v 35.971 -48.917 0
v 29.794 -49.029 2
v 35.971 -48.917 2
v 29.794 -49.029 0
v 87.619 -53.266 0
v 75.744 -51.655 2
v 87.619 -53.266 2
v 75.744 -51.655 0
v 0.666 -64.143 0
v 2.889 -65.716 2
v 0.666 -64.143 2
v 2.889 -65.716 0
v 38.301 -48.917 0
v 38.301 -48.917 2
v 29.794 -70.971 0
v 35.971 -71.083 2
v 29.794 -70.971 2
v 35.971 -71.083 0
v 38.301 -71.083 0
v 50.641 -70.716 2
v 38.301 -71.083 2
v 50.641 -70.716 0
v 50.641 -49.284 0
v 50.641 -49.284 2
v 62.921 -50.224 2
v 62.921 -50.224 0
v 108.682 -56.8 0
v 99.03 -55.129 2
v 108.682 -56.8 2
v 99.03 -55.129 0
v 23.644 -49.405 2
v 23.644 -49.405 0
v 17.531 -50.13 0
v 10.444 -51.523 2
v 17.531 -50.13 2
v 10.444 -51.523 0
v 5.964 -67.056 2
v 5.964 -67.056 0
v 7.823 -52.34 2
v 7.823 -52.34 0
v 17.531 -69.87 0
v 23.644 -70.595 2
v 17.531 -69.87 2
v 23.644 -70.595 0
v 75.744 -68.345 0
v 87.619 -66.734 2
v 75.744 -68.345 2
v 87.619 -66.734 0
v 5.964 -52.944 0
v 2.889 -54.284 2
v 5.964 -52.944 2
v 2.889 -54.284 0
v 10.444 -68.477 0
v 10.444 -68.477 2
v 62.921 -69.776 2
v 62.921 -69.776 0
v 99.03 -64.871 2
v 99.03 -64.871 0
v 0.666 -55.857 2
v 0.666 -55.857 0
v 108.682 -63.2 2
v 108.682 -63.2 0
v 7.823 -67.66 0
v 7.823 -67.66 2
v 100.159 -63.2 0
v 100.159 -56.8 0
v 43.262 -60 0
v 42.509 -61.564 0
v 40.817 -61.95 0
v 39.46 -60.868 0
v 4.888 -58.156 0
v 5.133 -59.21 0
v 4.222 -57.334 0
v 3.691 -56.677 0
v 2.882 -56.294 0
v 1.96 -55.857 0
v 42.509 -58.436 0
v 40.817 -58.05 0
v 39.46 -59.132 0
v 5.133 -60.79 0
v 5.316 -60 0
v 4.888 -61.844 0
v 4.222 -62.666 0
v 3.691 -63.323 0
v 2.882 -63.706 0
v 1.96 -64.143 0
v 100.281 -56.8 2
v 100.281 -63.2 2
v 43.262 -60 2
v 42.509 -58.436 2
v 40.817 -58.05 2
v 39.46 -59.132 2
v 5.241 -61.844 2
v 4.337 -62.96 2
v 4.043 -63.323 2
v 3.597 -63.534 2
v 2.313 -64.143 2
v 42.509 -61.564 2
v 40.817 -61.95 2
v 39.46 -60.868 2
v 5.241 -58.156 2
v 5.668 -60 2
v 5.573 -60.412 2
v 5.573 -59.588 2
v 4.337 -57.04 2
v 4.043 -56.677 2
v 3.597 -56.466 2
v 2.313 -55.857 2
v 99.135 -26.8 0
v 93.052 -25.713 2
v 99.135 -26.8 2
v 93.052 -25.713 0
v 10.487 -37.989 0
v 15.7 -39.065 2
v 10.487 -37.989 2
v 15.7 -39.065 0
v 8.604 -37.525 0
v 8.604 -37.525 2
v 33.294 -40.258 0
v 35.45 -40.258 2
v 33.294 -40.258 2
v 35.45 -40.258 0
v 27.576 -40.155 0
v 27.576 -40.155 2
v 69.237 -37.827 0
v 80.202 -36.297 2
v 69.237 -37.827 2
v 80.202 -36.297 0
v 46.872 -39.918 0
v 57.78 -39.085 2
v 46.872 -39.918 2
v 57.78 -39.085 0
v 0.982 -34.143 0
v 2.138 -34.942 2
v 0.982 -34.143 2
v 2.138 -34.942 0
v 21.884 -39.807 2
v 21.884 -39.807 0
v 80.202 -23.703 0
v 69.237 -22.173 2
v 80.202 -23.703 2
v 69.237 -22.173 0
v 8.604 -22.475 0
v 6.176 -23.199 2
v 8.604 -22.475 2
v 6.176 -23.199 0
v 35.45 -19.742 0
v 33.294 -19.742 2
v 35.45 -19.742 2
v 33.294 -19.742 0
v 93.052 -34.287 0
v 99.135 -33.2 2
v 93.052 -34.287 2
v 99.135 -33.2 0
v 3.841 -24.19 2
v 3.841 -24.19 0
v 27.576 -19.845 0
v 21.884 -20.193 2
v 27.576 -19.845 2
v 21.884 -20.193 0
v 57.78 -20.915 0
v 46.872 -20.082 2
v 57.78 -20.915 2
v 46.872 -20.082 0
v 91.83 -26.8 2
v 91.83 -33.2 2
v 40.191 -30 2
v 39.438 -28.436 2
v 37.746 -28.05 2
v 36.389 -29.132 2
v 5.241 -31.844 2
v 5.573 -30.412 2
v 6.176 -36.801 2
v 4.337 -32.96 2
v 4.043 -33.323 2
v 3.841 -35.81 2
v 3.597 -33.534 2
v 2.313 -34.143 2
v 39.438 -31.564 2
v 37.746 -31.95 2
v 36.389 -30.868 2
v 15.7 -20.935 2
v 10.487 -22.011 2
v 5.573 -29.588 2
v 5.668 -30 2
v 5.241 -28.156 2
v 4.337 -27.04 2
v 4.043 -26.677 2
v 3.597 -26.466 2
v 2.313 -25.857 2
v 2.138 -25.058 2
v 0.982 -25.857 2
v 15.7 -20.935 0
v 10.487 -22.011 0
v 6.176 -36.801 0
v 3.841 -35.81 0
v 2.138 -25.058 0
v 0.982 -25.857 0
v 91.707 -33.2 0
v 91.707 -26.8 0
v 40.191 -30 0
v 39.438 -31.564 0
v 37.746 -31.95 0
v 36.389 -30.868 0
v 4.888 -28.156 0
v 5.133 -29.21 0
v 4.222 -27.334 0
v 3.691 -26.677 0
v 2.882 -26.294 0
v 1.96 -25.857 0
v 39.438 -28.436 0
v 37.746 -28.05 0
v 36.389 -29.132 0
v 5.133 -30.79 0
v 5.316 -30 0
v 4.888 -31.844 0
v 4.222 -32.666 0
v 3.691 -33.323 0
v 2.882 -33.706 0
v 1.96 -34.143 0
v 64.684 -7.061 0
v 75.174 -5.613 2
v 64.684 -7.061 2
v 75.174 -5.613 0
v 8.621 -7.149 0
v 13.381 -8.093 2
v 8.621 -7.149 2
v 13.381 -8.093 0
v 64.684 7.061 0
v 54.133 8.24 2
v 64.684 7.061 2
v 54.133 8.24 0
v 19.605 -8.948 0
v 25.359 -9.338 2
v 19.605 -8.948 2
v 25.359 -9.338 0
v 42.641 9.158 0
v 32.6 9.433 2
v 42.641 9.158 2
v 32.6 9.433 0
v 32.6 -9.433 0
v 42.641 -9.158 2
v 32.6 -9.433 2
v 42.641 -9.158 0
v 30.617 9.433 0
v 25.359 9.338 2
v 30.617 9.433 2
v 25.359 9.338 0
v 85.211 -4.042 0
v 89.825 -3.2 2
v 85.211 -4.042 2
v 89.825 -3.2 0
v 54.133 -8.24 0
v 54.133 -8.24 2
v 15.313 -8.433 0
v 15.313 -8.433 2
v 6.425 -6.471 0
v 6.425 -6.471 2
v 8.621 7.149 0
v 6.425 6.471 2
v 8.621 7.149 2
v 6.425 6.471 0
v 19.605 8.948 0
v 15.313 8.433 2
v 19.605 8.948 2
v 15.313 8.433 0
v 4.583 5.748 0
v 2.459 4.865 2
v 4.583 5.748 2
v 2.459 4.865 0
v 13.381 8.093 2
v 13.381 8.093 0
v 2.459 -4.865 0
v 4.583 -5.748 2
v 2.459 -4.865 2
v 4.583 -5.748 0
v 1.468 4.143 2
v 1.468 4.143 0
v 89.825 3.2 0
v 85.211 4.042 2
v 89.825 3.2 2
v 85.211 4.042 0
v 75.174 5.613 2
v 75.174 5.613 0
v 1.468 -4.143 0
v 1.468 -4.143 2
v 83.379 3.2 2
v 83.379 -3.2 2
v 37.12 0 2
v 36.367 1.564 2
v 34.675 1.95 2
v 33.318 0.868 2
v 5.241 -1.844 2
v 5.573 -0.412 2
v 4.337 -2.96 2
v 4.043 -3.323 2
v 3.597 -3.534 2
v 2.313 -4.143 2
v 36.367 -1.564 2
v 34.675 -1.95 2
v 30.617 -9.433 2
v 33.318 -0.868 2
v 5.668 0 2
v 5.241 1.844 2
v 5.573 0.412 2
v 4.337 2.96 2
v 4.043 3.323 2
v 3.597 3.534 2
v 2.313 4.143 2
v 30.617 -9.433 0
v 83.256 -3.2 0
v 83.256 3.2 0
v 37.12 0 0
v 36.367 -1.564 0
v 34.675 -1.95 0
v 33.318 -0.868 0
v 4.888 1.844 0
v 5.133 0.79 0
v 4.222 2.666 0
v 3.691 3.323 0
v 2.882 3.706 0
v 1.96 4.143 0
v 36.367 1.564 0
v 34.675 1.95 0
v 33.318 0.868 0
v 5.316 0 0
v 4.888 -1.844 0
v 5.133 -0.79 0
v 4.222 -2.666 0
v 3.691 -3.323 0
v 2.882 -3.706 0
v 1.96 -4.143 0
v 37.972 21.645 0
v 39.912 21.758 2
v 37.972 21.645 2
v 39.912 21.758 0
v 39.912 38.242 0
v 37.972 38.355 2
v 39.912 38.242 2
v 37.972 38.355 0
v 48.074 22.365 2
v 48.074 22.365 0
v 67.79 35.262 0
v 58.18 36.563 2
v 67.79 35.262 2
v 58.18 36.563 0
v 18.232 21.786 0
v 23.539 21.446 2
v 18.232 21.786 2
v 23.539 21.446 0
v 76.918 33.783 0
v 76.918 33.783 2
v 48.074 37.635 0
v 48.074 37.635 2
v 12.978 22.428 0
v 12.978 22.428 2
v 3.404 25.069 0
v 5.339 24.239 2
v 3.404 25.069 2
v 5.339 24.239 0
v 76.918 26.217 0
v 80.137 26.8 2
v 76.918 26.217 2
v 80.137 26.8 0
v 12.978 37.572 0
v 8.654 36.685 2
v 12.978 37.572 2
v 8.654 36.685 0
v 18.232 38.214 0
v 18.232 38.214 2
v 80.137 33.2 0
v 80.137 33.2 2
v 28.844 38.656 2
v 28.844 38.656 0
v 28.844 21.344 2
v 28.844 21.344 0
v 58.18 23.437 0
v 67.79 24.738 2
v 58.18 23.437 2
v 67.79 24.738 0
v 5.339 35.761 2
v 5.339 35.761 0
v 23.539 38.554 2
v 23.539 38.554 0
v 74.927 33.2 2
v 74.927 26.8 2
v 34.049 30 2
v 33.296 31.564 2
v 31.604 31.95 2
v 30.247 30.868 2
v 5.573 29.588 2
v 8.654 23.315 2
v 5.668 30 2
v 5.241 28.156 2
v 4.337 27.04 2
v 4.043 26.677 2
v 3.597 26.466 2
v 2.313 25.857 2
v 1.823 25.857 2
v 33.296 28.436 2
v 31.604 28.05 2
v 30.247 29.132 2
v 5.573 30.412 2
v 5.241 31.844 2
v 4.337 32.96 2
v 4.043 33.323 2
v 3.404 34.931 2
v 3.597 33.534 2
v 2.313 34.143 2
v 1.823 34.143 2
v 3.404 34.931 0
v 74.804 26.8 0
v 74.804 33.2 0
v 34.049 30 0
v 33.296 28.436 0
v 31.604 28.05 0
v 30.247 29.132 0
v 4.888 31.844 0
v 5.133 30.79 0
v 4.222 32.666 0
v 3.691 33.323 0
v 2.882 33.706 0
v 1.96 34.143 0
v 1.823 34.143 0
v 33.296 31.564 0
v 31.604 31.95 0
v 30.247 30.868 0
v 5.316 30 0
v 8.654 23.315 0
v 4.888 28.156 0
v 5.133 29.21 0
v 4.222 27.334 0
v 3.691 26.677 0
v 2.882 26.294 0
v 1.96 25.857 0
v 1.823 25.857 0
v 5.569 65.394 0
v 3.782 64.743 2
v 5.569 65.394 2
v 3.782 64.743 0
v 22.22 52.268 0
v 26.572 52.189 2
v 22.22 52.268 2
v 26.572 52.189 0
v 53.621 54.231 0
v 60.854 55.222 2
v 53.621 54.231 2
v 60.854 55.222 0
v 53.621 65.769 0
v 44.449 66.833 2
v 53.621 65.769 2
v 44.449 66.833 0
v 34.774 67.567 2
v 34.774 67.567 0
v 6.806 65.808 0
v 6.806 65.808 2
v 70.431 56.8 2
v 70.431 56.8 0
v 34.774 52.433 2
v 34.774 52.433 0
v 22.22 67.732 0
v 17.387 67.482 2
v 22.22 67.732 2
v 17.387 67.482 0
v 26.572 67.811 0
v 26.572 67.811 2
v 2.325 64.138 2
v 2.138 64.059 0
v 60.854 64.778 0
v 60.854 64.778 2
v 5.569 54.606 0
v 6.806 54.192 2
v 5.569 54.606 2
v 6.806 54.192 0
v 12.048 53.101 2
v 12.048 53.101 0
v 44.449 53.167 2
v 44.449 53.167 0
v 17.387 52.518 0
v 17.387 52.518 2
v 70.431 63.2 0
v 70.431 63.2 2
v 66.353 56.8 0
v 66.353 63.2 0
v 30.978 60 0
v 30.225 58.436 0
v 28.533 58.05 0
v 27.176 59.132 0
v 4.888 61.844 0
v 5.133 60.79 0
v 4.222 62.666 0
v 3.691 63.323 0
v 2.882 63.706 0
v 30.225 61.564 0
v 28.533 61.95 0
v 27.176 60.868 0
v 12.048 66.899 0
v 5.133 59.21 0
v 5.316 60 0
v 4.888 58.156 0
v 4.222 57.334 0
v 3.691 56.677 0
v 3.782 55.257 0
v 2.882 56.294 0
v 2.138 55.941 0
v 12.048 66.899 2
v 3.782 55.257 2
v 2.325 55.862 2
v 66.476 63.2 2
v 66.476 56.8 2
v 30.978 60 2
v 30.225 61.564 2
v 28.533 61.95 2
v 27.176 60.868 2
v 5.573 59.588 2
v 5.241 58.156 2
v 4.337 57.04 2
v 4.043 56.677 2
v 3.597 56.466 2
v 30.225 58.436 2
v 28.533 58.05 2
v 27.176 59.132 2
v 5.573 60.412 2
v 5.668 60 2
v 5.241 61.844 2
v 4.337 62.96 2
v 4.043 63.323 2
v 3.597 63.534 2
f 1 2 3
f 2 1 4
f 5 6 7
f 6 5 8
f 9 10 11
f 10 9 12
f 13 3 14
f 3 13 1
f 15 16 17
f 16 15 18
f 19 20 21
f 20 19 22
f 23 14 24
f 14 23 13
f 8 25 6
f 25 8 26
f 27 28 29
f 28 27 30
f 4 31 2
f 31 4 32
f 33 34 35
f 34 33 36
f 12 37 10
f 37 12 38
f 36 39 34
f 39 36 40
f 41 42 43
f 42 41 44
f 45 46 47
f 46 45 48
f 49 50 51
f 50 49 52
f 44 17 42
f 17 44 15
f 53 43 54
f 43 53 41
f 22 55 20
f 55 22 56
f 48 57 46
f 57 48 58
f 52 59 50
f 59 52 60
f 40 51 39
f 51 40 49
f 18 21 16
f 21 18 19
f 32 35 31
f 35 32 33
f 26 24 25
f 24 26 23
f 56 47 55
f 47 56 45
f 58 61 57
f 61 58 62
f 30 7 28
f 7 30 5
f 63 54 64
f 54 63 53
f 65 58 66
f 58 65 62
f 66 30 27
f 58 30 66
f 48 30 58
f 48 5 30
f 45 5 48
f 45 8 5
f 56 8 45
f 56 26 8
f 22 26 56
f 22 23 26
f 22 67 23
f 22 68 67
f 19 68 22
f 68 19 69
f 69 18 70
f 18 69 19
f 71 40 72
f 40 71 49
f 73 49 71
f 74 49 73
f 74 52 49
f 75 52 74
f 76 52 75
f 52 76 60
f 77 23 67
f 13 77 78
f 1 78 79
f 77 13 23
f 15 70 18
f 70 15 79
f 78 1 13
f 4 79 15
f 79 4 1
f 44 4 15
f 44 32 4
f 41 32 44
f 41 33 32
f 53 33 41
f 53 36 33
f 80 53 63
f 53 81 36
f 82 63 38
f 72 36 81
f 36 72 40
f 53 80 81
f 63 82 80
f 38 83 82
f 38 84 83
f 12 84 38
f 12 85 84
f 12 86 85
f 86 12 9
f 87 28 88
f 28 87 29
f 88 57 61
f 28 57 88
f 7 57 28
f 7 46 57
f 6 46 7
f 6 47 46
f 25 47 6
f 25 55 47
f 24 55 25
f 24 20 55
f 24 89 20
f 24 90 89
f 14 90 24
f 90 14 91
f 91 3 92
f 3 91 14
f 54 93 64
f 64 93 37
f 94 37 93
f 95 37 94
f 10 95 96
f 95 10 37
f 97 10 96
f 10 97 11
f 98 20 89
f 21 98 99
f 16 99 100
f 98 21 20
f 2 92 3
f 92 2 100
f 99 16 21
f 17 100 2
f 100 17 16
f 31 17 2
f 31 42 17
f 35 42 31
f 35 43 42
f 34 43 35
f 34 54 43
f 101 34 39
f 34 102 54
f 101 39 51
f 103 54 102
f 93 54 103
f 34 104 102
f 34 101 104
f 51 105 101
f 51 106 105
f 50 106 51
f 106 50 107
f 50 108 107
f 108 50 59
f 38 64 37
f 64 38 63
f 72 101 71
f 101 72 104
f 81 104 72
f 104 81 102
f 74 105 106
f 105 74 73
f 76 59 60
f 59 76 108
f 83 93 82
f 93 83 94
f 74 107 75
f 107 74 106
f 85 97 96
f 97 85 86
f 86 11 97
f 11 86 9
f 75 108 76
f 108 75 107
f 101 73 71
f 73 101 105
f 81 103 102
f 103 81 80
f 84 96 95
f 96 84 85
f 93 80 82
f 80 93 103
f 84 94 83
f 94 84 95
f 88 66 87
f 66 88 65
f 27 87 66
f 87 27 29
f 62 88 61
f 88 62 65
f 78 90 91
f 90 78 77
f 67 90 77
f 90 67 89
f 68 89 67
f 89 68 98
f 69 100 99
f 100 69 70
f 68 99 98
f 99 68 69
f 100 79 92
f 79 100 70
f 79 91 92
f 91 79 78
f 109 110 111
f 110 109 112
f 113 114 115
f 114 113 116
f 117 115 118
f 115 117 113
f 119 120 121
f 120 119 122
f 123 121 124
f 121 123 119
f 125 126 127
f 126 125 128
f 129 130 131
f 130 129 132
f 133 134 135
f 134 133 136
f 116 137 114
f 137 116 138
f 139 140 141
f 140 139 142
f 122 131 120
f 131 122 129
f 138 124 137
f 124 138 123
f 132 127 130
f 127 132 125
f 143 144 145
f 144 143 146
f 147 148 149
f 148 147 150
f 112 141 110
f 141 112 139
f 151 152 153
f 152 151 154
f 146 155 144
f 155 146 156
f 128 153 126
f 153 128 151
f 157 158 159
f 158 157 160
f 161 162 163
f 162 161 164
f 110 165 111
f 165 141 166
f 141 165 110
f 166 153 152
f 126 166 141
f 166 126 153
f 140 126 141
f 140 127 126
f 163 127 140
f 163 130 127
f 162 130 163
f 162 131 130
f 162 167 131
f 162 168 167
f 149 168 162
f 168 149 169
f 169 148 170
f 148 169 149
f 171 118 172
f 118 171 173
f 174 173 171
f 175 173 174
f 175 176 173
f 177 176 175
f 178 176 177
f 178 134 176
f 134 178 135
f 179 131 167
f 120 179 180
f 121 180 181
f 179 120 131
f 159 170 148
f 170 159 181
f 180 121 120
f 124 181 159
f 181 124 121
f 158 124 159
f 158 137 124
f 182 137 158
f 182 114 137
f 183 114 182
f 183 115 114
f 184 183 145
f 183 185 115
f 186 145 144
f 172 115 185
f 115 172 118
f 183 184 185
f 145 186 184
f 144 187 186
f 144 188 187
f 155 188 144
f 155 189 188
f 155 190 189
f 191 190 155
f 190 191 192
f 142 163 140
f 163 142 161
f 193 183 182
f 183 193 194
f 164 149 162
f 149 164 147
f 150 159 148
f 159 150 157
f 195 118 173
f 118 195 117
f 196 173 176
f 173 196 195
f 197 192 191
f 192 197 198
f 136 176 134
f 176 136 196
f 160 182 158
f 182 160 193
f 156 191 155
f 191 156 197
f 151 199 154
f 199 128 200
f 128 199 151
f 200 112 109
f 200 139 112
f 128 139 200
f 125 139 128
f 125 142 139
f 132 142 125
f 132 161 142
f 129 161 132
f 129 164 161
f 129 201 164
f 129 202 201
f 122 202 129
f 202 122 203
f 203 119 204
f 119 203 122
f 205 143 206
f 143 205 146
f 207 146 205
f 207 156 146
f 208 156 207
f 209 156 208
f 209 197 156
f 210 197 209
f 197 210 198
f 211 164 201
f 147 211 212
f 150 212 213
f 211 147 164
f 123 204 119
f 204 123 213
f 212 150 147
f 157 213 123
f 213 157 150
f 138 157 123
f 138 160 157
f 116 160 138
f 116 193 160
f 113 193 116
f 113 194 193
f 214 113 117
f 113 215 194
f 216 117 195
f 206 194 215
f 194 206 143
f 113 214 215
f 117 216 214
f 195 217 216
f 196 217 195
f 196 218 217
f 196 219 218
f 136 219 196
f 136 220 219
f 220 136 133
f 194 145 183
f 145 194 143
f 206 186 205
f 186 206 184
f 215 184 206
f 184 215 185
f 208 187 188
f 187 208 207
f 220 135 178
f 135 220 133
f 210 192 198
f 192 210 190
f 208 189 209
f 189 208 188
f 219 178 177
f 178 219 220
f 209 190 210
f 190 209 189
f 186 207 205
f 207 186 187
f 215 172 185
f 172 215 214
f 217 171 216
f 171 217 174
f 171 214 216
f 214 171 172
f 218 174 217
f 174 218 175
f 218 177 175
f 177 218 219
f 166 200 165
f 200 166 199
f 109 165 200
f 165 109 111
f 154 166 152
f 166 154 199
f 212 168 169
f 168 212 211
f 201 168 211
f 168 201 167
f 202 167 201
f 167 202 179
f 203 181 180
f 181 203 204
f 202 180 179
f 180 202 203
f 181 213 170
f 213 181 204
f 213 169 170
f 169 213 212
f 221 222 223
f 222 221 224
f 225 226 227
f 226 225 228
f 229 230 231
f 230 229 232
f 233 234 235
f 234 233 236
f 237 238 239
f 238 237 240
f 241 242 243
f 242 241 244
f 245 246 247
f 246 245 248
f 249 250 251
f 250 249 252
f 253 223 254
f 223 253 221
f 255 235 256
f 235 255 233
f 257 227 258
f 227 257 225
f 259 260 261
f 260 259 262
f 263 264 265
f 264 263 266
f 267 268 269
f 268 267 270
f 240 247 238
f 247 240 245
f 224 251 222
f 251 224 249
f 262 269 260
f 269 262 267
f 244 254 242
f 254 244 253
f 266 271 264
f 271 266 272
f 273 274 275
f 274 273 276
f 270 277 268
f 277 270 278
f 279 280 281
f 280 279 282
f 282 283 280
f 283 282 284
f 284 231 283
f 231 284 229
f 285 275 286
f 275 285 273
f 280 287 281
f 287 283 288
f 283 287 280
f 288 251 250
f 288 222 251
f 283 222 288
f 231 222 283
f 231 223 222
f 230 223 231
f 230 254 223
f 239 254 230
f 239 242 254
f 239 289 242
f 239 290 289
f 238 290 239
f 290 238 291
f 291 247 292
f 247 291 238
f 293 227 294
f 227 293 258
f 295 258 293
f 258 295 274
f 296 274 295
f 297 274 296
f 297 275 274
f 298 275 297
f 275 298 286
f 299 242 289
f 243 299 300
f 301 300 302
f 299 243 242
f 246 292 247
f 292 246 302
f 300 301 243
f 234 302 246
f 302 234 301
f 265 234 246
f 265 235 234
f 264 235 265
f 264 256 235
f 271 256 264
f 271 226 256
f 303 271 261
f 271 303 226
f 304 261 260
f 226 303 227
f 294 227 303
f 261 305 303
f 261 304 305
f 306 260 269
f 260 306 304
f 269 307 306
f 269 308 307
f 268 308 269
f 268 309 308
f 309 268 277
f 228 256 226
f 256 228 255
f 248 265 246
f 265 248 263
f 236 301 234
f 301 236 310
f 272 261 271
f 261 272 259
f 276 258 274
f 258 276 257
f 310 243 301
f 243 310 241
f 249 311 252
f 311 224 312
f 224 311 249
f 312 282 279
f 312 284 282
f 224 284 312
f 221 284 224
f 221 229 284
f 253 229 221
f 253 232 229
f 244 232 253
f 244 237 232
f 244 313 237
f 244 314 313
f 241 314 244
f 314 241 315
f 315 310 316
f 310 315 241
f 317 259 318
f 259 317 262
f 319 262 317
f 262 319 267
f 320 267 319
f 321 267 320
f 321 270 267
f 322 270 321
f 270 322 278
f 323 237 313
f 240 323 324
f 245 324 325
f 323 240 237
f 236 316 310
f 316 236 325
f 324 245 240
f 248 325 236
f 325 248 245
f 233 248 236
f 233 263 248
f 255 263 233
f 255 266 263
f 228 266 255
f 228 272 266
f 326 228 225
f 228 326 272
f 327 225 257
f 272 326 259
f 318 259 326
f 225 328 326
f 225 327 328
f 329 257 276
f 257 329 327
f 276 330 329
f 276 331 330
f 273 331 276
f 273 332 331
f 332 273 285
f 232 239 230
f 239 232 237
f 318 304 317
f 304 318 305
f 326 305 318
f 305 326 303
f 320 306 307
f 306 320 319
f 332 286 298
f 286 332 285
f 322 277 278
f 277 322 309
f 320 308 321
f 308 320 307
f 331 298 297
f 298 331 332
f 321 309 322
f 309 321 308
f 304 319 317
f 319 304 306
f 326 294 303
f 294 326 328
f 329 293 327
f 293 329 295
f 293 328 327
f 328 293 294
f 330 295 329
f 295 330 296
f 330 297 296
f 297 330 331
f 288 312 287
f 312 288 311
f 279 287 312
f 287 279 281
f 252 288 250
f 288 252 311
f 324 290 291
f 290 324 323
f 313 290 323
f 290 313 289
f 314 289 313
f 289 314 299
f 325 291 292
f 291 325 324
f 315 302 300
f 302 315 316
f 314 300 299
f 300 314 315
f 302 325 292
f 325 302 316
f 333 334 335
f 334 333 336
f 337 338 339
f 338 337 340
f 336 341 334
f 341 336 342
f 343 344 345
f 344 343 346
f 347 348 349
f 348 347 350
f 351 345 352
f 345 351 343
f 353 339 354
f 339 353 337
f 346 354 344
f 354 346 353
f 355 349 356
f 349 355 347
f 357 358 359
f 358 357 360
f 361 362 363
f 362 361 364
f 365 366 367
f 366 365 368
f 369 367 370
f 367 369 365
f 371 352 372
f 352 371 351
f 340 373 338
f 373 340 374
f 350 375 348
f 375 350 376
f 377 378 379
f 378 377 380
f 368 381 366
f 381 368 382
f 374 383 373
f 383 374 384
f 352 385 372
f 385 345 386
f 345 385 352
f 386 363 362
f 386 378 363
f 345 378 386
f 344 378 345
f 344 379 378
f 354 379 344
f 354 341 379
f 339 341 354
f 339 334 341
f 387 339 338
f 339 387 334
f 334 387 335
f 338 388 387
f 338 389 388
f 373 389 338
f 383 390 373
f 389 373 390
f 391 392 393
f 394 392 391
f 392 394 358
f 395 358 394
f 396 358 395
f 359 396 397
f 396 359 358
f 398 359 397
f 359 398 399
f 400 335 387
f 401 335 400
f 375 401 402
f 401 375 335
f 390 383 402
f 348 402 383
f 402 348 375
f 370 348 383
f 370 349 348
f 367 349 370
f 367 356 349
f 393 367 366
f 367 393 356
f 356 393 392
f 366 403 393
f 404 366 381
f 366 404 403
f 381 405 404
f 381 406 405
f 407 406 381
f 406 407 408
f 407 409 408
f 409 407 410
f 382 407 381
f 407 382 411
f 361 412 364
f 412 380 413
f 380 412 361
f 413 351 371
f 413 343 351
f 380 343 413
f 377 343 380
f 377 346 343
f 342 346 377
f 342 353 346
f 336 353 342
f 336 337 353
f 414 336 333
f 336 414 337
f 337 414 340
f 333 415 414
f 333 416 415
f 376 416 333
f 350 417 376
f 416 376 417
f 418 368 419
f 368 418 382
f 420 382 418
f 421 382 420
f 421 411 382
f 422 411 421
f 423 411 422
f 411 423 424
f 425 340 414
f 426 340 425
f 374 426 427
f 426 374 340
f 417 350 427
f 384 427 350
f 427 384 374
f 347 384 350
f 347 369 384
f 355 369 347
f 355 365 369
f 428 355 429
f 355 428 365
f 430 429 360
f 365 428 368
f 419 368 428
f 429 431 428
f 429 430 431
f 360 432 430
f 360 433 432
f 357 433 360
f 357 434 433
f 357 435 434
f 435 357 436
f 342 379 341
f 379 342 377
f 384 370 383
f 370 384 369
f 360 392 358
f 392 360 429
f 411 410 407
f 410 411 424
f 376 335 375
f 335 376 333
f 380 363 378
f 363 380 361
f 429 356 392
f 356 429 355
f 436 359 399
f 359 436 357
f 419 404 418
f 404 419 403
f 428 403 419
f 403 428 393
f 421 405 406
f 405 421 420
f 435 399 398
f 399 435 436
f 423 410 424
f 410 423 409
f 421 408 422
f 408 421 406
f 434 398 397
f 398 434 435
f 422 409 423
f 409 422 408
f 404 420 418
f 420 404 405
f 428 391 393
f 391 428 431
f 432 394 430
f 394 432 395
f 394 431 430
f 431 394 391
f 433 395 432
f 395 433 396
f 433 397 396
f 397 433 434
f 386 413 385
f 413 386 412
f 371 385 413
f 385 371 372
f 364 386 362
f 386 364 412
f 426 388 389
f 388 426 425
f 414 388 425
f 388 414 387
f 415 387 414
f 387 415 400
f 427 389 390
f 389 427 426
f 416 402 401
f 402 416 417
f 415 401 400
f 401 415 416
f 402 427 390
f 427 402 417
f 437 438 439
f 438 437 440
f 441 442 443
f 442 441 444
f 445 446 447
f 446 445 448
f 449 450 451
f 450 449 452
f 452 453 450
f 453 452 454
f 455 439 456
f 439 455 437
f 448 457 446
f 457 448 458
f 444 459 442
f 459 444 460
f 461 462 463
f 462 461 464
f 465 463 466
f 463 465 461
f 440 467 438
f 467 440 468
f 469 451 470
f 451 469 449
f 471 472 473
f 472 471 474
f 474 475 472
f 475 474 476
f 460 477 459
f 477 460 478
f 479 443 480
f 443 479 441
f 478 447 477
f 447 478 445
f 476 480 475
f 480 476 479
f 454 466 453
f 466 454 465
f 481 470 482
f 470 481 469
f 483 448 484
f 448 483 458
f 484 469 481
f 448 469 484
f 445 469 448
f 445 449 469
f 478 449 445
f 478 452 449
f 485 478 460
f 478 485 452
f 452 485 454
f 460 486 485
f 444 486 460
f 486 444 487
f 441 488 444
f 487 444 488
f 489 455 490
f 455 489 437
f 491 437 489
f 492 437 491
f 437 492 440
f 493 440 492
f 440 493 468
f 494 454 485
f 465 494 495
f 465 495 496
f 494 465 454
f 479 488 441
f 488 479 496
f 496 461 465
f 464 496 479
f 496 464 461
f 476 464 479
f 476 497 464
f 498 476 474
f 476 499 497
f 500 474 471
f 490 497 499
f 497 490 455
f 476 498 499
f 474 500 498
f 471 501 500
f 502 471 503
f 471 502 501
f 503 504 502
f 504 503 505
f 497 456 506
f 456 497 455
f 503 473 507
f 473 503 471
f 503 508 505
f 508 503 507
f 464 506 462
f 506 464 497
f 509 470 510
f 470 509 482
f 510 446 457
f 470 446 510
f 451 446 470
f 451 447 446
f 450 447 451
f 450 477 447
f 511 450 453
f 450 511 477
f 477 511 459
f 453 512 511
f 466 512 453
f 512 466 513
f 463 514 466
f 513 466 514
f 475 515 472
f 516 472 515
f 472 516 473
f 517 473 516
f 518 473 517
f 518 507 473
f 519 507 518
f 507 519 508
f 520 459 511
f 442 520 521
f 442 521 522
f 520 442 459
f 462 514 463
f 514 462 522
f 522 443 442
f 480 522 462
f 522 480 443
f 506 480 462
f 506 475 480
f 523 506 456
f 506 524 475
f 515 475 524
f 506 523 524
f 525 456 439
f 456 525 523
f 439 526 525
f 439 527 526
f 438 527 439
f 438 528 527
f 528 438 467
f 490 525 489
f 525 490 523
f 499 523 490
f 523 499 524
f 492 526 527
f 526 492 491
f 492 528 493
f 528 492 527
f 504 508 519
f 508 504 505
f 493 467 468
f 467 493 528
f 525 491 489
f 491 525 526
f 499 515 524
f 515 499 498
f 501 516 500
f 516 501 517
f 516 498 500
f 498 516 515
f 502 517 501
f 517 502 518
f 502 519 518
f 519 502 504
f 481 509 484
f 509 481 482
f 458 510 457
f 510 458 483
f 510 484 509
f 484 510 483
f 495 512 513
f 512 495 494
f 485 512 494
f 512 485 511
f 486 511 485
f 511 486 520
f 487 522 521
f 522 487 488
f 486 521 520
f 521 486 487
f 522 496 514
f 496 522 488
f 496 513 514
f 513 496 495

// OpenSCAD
// file: naca0018.scad
module naca0018(chord, height)
{
  hull() {
    translate([0.000000 * chord,0,0]) cylinder(r = 0.000000 * chord, h = height);
    translate([0.012500 * chord,0,0]) cylinder(r = 0.028409 * chord, h = height);
    translate([0.025000 * chord,0,0]) cylinder(r = 0.039221 * chord, h = height);
    translate([0.050000 * chord,0,0]) cylinder(r = 0.053320 * chord, h = height);
    translate([0.075000 * chord,0,0]) cylinder(r = 0.062999 * chord, h = height);
    translate([0.100000 * chord,0,0]) cylinder(r = 0.070242 * chord, h = height);
    translate([0.150000 * chord,0,0]) cylinder(r = 0.080177 * chord, h = height);
    translate([0.200000 * chord,0,0]) cylinder(r = 0.086063 * chord, h = height);
    translate([0.250000 * chord,0,0]) cylinder(r = 0.089119 * chord, h = height);
    translate([0.300000 * chord,0,0]) cylinder(r = 0.090026 * chord, h = height);
    translate([0.400000 * chord,0,0]) cylinder(r = 0.087045 * chord, h = height);
    translate([0.500000 * chord,0,0]) cylinder(r = 0.079410 * chord, h = height);
    translate([0.600000 * chord,0,0]) cylinder(r = 0.068451 * chord, h = height);
    translate([0.700000 * chord,0,0]) cylinder(r = 0.054959 * chord, h = height);
    translate([0.800000 * chord,0,0]) cylinder(r = 0.039347 * chord, h = height);
    translate([0.900000 * chord,0,0]) cylinder(r = 0.021716 * chord, h = height);
    translate([0.950000 * chord,0,0]) cylinder(r = 0.012098 * chord, h = height);
    translate([1.000000 * chord,0,0]) cylinder(r = 0.001890 * chord, h = height);
  }
}

naca0018(100, 3);
// file: constants.scad
/*
 * Written by Dermot Tynan, Kalopa Research.
 * GPLv2.
 *
 * This file has all the constants for the OpenWing sail.
 *
 * All dimensions are in mm.
 */

bearing_inner_radius = 4.0;
bearing_outer_radius = 11.0 * 1.02;
bearing_height = 7.0;

mast_clearance_radius = 5.0;

a_section_chord = 133.0;

le_tube_radius = 4.0 * 1.0625;

te_depth = 6.4;
te_width = 20.0;
// main file
/*
 * Written by Dermot Tynan, Kalopa Research.
 * GPLv2.
 *
 * This is the definition for the five mast supports on the upper
 * leading-edge of the mast, A8 -> A12.
 *
 * All dimensions are in mm.
 */
include <constants.scad>

use <naca0018.scad>

module upper_support(off)
{
	difference() {
		naca0018(off, 2);
		translate([1, 0, 0]) rotate(a = [0, 10, 0]) cylinder(r = le_tube_radius, h = 10, center = true);
		translate([off*0.9173, 0, 6]) rotate(a = [0, 3.5, 0]) cube([26, te_depth, 20], center = true);
		translate([off / 3, 0, 0]) cylinder(r = 2, h = 12, center = true);
	}
}

translate([0, -60, 0]) upper_support(123.787);
translate([0, -30, 0]) upper_support(114.574);
translate([0, 0, 0]) upper_support(105.361);
translate([0, 30, 0]) upper_support(96.147);
translate([0, 60, 0]) upper_support(86.934);
